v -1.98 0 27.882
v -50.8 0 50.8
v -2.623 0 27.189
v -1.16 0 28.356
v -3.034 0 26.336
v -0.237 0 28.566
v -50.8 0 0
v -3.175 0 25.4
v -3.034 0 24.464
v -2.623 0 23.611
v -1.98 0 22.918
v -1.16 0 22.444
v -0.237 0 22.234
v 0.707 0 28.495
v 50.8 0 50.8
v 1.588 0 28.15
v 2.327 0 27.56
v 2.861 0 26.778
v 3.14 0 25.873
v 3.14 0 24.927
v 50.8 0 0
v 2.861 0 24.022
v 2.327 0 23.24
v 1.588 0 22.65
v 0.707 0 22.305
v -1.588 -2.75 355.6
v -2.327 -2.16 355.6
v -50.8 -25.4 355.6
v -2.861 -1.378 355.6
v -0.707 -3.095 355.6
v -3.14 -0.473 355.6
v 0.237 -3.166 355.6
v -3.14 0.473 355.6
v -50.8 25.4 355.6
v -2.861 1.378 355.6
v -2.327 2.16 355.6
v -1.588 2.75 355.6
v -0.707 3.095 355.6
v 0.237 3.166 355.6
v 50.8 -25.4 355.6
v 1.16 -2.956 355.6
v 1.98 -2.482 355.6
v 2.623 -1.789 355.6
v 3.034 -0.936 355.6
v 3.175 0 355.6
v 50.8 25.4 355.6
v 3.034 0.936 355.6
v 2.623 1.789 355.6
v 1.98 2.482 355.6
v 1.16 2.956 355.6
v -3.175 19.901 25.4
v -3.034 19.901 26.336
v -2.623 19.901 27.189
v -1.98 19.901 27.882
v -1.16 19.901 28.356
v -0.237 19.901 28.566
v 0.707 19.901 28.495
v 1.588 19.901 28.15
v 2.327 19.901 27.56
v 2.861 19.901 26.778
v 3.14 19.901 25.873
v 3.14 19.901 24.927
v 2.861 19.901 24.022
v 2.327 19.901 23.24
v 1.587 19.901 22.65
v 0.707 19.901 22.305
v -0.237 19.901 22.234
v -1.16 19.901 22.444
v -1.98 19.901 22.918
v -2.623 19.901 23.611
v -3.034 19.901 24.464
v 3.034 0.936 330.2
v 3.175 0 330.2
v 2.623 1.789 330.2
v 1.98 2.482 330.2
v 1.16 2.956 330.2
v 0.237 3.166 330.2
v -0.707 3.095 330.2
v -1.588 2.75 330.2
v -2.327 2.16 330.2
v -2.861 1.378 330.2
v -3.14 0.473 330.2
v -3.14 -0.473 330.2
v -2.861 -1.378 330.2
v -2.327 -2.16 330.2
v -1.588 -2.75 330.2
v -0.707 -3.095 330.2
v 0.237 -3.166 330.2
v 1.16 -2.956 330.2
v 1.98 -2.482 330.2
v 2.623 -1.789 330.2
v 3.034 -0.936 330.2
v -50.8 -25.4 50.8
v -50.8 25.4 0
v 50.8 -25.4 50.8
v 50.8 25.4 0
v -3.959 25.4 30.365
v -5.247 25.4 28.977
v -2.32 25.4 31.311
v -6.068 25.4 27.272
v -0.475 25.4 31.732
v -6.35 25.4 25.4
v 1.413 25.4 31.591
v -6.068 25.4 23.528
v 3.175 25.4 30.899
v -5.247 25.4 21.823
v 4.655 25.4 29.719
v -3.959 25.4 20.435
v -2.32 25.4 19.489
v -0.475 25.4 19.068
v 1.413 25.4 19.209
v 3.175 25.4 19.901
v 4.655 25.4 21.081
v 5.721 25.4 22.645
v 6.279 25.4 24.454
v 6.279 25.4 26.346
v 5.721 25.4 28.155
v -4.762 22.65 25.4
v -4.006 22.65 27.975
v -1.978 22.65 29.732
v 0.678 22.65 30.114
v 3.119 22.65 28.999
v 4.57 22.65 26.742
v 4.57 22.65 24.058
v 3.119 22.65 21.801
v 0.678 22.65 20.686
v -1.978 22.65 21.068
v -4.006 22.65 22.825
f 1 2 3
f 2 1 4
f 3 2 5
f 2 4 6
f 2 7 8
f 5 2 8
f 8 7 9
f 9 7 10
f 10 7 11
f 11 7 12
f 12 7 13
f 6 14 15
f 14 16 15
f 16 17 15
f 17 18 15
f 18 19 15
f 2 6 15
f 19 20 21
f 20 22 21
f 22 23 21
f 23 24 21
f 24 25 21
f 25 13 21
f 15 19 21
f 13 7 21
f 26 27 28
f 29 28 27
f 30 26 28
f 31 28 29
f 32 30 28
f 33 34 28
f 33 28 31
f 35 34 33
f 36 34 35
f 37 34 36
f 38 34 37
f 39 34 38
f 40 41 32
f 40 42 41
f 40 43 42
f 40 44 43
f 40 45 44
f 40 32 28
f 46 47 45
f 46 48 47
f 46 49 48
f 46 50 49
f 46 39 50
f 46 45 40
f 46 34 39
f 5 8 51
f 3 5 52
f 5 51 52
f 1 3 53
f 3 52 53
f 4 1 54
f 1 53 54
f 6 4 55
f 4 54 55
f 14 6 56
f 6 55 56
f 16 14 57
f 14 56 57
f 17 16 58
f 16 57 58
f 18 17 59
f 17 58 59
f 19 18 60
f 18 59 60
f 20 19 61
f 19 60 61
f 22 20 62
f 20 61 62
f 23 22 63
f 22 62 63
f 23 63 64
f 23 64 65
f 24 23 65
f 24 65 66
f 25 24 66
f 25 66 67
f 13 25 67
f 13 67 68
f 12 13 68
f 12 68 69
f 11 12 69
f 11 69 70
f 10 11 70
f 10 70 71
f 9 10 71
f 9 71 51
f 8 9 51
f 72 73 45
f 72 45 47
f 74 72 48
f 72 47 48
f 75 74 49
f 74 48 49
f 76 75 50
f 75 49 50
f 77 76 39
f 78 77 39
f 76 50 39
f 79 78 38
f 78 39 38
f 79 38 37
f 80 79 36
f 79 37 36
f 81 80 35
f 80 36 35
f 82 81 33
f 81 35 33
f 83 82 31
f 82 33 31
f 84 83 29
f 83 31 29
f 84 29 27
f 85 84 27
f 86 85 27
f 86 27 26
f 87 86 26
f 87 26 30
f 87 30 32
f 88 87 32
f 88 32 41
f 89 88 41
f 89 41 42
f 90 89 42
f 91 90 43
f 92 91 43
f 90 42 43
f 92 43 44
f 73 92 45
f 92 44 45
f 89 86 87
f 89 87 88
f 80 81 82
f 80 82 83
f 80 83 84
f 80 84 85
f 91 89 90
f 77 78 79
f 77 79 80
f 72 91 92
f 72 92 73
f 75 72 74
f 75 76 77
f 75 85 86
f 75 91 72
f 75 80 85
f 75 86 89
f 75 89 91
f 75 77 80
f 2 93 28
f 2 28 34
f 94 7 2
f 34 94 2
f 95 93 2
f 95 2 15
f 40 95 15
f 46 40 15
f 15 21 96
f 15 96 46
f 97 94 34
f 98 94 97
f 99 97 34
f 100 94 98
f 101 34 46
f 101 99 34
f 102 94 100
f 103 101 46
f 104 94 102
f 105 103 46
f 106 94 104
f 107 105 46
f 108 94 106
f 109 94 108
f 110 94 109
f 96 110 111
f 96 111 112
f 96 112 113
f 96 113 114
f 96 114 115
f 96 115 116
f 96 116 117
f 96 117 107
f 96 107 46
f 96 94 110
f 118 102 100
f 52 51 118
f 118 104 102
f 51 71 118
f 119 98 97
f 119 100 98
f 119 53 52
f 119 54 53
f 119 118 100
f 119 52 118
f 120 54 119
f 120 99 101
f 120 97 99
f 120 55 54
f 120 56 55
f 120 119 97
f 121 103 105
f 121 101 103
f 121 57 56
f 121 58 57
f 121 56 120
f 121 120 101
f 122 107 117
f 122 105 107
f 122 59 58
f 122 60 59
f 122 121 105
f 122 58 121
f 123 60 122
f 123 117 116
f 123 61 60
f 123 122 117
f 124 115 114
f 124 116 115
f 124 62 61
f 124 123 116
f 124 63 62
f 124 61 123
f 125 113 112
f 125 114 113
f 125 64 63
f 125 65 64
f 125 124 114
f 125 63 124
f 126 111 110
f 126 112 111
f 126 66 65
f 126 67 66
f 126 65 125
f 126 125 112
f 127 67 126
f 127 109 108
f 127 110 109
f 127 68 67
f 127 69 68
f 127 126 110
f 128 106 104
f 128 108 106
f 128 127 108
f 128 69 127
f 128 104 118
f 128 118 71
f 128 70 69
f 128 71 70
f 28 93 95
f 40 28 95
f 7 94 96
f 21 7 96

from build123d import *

# Parameters (mm, degrees)
F0_W     = 101.6
F0_H     = 50.8
F1_DEPTH = 355.6
F2_W     = 101.6
F2_H     = 25.4
F3_DEPTH = 50.8
F4_R     = 3.175
F5_DEPTH = 50.801
F6_R     = 3.175
F7_DEPTH = 25.4
F8_R     = 6.35
F9_DEPTH = 6.35
F9_TAPER = 30


with BuildPart() as f1:
    # F0 (on Top) → F1 (new body)
    with BuildSketch(Plane.XY):
        Rectangle(F0_W, F0_H)
    extrude(amount=F1_DEPTH)

    # F2 (on face) → F3 (cut)
    with BuildSketch(Plane(origin=(0, 0, 0), x_dir=(1, 0, 0), z_dir=(0, 0, -1))):
        with Locations((0, 12.7)):
            Rectangle(F2_W, F2_H)
    extrude(amount=-F3_DEPTH, mode=Mode.SUBTRACT)

    # F4 (on face) → F5 (cut, through all)
    with BuildSketch(Plane(origin=(0, 25.4, 0), x_dir=(-1, 0, 0), z_dir=(0, 1, 0))):
        with Locations((0, 25.4)):
            Circle(F4_R)
    extrude(amount=-F5_DEPTH, mode=Mode.SUBTRACT)

    # F6 (on face) → F7 (cut)
    with BuildSketch(Plane.XY.offset(355.6)):
        Circle(F6_R)
    extrude(amount=-F7_DEPTH, mode=Mode.SUBTRACT)

    # F8 (on face) → F9 (cut)
    with BuildSketch(Plane(origin=(0, 25.4, 0), x_dir=(-1, 0, 0), z_dir=(0, 1, 0))):
        with Locations((0, 25.4)):
            Circle(F8_R)
    extrude(amount=-F9_DEPTH, taper=F9_TAPER, mode=Mode.SUBTRACT)


solid = f1.part
